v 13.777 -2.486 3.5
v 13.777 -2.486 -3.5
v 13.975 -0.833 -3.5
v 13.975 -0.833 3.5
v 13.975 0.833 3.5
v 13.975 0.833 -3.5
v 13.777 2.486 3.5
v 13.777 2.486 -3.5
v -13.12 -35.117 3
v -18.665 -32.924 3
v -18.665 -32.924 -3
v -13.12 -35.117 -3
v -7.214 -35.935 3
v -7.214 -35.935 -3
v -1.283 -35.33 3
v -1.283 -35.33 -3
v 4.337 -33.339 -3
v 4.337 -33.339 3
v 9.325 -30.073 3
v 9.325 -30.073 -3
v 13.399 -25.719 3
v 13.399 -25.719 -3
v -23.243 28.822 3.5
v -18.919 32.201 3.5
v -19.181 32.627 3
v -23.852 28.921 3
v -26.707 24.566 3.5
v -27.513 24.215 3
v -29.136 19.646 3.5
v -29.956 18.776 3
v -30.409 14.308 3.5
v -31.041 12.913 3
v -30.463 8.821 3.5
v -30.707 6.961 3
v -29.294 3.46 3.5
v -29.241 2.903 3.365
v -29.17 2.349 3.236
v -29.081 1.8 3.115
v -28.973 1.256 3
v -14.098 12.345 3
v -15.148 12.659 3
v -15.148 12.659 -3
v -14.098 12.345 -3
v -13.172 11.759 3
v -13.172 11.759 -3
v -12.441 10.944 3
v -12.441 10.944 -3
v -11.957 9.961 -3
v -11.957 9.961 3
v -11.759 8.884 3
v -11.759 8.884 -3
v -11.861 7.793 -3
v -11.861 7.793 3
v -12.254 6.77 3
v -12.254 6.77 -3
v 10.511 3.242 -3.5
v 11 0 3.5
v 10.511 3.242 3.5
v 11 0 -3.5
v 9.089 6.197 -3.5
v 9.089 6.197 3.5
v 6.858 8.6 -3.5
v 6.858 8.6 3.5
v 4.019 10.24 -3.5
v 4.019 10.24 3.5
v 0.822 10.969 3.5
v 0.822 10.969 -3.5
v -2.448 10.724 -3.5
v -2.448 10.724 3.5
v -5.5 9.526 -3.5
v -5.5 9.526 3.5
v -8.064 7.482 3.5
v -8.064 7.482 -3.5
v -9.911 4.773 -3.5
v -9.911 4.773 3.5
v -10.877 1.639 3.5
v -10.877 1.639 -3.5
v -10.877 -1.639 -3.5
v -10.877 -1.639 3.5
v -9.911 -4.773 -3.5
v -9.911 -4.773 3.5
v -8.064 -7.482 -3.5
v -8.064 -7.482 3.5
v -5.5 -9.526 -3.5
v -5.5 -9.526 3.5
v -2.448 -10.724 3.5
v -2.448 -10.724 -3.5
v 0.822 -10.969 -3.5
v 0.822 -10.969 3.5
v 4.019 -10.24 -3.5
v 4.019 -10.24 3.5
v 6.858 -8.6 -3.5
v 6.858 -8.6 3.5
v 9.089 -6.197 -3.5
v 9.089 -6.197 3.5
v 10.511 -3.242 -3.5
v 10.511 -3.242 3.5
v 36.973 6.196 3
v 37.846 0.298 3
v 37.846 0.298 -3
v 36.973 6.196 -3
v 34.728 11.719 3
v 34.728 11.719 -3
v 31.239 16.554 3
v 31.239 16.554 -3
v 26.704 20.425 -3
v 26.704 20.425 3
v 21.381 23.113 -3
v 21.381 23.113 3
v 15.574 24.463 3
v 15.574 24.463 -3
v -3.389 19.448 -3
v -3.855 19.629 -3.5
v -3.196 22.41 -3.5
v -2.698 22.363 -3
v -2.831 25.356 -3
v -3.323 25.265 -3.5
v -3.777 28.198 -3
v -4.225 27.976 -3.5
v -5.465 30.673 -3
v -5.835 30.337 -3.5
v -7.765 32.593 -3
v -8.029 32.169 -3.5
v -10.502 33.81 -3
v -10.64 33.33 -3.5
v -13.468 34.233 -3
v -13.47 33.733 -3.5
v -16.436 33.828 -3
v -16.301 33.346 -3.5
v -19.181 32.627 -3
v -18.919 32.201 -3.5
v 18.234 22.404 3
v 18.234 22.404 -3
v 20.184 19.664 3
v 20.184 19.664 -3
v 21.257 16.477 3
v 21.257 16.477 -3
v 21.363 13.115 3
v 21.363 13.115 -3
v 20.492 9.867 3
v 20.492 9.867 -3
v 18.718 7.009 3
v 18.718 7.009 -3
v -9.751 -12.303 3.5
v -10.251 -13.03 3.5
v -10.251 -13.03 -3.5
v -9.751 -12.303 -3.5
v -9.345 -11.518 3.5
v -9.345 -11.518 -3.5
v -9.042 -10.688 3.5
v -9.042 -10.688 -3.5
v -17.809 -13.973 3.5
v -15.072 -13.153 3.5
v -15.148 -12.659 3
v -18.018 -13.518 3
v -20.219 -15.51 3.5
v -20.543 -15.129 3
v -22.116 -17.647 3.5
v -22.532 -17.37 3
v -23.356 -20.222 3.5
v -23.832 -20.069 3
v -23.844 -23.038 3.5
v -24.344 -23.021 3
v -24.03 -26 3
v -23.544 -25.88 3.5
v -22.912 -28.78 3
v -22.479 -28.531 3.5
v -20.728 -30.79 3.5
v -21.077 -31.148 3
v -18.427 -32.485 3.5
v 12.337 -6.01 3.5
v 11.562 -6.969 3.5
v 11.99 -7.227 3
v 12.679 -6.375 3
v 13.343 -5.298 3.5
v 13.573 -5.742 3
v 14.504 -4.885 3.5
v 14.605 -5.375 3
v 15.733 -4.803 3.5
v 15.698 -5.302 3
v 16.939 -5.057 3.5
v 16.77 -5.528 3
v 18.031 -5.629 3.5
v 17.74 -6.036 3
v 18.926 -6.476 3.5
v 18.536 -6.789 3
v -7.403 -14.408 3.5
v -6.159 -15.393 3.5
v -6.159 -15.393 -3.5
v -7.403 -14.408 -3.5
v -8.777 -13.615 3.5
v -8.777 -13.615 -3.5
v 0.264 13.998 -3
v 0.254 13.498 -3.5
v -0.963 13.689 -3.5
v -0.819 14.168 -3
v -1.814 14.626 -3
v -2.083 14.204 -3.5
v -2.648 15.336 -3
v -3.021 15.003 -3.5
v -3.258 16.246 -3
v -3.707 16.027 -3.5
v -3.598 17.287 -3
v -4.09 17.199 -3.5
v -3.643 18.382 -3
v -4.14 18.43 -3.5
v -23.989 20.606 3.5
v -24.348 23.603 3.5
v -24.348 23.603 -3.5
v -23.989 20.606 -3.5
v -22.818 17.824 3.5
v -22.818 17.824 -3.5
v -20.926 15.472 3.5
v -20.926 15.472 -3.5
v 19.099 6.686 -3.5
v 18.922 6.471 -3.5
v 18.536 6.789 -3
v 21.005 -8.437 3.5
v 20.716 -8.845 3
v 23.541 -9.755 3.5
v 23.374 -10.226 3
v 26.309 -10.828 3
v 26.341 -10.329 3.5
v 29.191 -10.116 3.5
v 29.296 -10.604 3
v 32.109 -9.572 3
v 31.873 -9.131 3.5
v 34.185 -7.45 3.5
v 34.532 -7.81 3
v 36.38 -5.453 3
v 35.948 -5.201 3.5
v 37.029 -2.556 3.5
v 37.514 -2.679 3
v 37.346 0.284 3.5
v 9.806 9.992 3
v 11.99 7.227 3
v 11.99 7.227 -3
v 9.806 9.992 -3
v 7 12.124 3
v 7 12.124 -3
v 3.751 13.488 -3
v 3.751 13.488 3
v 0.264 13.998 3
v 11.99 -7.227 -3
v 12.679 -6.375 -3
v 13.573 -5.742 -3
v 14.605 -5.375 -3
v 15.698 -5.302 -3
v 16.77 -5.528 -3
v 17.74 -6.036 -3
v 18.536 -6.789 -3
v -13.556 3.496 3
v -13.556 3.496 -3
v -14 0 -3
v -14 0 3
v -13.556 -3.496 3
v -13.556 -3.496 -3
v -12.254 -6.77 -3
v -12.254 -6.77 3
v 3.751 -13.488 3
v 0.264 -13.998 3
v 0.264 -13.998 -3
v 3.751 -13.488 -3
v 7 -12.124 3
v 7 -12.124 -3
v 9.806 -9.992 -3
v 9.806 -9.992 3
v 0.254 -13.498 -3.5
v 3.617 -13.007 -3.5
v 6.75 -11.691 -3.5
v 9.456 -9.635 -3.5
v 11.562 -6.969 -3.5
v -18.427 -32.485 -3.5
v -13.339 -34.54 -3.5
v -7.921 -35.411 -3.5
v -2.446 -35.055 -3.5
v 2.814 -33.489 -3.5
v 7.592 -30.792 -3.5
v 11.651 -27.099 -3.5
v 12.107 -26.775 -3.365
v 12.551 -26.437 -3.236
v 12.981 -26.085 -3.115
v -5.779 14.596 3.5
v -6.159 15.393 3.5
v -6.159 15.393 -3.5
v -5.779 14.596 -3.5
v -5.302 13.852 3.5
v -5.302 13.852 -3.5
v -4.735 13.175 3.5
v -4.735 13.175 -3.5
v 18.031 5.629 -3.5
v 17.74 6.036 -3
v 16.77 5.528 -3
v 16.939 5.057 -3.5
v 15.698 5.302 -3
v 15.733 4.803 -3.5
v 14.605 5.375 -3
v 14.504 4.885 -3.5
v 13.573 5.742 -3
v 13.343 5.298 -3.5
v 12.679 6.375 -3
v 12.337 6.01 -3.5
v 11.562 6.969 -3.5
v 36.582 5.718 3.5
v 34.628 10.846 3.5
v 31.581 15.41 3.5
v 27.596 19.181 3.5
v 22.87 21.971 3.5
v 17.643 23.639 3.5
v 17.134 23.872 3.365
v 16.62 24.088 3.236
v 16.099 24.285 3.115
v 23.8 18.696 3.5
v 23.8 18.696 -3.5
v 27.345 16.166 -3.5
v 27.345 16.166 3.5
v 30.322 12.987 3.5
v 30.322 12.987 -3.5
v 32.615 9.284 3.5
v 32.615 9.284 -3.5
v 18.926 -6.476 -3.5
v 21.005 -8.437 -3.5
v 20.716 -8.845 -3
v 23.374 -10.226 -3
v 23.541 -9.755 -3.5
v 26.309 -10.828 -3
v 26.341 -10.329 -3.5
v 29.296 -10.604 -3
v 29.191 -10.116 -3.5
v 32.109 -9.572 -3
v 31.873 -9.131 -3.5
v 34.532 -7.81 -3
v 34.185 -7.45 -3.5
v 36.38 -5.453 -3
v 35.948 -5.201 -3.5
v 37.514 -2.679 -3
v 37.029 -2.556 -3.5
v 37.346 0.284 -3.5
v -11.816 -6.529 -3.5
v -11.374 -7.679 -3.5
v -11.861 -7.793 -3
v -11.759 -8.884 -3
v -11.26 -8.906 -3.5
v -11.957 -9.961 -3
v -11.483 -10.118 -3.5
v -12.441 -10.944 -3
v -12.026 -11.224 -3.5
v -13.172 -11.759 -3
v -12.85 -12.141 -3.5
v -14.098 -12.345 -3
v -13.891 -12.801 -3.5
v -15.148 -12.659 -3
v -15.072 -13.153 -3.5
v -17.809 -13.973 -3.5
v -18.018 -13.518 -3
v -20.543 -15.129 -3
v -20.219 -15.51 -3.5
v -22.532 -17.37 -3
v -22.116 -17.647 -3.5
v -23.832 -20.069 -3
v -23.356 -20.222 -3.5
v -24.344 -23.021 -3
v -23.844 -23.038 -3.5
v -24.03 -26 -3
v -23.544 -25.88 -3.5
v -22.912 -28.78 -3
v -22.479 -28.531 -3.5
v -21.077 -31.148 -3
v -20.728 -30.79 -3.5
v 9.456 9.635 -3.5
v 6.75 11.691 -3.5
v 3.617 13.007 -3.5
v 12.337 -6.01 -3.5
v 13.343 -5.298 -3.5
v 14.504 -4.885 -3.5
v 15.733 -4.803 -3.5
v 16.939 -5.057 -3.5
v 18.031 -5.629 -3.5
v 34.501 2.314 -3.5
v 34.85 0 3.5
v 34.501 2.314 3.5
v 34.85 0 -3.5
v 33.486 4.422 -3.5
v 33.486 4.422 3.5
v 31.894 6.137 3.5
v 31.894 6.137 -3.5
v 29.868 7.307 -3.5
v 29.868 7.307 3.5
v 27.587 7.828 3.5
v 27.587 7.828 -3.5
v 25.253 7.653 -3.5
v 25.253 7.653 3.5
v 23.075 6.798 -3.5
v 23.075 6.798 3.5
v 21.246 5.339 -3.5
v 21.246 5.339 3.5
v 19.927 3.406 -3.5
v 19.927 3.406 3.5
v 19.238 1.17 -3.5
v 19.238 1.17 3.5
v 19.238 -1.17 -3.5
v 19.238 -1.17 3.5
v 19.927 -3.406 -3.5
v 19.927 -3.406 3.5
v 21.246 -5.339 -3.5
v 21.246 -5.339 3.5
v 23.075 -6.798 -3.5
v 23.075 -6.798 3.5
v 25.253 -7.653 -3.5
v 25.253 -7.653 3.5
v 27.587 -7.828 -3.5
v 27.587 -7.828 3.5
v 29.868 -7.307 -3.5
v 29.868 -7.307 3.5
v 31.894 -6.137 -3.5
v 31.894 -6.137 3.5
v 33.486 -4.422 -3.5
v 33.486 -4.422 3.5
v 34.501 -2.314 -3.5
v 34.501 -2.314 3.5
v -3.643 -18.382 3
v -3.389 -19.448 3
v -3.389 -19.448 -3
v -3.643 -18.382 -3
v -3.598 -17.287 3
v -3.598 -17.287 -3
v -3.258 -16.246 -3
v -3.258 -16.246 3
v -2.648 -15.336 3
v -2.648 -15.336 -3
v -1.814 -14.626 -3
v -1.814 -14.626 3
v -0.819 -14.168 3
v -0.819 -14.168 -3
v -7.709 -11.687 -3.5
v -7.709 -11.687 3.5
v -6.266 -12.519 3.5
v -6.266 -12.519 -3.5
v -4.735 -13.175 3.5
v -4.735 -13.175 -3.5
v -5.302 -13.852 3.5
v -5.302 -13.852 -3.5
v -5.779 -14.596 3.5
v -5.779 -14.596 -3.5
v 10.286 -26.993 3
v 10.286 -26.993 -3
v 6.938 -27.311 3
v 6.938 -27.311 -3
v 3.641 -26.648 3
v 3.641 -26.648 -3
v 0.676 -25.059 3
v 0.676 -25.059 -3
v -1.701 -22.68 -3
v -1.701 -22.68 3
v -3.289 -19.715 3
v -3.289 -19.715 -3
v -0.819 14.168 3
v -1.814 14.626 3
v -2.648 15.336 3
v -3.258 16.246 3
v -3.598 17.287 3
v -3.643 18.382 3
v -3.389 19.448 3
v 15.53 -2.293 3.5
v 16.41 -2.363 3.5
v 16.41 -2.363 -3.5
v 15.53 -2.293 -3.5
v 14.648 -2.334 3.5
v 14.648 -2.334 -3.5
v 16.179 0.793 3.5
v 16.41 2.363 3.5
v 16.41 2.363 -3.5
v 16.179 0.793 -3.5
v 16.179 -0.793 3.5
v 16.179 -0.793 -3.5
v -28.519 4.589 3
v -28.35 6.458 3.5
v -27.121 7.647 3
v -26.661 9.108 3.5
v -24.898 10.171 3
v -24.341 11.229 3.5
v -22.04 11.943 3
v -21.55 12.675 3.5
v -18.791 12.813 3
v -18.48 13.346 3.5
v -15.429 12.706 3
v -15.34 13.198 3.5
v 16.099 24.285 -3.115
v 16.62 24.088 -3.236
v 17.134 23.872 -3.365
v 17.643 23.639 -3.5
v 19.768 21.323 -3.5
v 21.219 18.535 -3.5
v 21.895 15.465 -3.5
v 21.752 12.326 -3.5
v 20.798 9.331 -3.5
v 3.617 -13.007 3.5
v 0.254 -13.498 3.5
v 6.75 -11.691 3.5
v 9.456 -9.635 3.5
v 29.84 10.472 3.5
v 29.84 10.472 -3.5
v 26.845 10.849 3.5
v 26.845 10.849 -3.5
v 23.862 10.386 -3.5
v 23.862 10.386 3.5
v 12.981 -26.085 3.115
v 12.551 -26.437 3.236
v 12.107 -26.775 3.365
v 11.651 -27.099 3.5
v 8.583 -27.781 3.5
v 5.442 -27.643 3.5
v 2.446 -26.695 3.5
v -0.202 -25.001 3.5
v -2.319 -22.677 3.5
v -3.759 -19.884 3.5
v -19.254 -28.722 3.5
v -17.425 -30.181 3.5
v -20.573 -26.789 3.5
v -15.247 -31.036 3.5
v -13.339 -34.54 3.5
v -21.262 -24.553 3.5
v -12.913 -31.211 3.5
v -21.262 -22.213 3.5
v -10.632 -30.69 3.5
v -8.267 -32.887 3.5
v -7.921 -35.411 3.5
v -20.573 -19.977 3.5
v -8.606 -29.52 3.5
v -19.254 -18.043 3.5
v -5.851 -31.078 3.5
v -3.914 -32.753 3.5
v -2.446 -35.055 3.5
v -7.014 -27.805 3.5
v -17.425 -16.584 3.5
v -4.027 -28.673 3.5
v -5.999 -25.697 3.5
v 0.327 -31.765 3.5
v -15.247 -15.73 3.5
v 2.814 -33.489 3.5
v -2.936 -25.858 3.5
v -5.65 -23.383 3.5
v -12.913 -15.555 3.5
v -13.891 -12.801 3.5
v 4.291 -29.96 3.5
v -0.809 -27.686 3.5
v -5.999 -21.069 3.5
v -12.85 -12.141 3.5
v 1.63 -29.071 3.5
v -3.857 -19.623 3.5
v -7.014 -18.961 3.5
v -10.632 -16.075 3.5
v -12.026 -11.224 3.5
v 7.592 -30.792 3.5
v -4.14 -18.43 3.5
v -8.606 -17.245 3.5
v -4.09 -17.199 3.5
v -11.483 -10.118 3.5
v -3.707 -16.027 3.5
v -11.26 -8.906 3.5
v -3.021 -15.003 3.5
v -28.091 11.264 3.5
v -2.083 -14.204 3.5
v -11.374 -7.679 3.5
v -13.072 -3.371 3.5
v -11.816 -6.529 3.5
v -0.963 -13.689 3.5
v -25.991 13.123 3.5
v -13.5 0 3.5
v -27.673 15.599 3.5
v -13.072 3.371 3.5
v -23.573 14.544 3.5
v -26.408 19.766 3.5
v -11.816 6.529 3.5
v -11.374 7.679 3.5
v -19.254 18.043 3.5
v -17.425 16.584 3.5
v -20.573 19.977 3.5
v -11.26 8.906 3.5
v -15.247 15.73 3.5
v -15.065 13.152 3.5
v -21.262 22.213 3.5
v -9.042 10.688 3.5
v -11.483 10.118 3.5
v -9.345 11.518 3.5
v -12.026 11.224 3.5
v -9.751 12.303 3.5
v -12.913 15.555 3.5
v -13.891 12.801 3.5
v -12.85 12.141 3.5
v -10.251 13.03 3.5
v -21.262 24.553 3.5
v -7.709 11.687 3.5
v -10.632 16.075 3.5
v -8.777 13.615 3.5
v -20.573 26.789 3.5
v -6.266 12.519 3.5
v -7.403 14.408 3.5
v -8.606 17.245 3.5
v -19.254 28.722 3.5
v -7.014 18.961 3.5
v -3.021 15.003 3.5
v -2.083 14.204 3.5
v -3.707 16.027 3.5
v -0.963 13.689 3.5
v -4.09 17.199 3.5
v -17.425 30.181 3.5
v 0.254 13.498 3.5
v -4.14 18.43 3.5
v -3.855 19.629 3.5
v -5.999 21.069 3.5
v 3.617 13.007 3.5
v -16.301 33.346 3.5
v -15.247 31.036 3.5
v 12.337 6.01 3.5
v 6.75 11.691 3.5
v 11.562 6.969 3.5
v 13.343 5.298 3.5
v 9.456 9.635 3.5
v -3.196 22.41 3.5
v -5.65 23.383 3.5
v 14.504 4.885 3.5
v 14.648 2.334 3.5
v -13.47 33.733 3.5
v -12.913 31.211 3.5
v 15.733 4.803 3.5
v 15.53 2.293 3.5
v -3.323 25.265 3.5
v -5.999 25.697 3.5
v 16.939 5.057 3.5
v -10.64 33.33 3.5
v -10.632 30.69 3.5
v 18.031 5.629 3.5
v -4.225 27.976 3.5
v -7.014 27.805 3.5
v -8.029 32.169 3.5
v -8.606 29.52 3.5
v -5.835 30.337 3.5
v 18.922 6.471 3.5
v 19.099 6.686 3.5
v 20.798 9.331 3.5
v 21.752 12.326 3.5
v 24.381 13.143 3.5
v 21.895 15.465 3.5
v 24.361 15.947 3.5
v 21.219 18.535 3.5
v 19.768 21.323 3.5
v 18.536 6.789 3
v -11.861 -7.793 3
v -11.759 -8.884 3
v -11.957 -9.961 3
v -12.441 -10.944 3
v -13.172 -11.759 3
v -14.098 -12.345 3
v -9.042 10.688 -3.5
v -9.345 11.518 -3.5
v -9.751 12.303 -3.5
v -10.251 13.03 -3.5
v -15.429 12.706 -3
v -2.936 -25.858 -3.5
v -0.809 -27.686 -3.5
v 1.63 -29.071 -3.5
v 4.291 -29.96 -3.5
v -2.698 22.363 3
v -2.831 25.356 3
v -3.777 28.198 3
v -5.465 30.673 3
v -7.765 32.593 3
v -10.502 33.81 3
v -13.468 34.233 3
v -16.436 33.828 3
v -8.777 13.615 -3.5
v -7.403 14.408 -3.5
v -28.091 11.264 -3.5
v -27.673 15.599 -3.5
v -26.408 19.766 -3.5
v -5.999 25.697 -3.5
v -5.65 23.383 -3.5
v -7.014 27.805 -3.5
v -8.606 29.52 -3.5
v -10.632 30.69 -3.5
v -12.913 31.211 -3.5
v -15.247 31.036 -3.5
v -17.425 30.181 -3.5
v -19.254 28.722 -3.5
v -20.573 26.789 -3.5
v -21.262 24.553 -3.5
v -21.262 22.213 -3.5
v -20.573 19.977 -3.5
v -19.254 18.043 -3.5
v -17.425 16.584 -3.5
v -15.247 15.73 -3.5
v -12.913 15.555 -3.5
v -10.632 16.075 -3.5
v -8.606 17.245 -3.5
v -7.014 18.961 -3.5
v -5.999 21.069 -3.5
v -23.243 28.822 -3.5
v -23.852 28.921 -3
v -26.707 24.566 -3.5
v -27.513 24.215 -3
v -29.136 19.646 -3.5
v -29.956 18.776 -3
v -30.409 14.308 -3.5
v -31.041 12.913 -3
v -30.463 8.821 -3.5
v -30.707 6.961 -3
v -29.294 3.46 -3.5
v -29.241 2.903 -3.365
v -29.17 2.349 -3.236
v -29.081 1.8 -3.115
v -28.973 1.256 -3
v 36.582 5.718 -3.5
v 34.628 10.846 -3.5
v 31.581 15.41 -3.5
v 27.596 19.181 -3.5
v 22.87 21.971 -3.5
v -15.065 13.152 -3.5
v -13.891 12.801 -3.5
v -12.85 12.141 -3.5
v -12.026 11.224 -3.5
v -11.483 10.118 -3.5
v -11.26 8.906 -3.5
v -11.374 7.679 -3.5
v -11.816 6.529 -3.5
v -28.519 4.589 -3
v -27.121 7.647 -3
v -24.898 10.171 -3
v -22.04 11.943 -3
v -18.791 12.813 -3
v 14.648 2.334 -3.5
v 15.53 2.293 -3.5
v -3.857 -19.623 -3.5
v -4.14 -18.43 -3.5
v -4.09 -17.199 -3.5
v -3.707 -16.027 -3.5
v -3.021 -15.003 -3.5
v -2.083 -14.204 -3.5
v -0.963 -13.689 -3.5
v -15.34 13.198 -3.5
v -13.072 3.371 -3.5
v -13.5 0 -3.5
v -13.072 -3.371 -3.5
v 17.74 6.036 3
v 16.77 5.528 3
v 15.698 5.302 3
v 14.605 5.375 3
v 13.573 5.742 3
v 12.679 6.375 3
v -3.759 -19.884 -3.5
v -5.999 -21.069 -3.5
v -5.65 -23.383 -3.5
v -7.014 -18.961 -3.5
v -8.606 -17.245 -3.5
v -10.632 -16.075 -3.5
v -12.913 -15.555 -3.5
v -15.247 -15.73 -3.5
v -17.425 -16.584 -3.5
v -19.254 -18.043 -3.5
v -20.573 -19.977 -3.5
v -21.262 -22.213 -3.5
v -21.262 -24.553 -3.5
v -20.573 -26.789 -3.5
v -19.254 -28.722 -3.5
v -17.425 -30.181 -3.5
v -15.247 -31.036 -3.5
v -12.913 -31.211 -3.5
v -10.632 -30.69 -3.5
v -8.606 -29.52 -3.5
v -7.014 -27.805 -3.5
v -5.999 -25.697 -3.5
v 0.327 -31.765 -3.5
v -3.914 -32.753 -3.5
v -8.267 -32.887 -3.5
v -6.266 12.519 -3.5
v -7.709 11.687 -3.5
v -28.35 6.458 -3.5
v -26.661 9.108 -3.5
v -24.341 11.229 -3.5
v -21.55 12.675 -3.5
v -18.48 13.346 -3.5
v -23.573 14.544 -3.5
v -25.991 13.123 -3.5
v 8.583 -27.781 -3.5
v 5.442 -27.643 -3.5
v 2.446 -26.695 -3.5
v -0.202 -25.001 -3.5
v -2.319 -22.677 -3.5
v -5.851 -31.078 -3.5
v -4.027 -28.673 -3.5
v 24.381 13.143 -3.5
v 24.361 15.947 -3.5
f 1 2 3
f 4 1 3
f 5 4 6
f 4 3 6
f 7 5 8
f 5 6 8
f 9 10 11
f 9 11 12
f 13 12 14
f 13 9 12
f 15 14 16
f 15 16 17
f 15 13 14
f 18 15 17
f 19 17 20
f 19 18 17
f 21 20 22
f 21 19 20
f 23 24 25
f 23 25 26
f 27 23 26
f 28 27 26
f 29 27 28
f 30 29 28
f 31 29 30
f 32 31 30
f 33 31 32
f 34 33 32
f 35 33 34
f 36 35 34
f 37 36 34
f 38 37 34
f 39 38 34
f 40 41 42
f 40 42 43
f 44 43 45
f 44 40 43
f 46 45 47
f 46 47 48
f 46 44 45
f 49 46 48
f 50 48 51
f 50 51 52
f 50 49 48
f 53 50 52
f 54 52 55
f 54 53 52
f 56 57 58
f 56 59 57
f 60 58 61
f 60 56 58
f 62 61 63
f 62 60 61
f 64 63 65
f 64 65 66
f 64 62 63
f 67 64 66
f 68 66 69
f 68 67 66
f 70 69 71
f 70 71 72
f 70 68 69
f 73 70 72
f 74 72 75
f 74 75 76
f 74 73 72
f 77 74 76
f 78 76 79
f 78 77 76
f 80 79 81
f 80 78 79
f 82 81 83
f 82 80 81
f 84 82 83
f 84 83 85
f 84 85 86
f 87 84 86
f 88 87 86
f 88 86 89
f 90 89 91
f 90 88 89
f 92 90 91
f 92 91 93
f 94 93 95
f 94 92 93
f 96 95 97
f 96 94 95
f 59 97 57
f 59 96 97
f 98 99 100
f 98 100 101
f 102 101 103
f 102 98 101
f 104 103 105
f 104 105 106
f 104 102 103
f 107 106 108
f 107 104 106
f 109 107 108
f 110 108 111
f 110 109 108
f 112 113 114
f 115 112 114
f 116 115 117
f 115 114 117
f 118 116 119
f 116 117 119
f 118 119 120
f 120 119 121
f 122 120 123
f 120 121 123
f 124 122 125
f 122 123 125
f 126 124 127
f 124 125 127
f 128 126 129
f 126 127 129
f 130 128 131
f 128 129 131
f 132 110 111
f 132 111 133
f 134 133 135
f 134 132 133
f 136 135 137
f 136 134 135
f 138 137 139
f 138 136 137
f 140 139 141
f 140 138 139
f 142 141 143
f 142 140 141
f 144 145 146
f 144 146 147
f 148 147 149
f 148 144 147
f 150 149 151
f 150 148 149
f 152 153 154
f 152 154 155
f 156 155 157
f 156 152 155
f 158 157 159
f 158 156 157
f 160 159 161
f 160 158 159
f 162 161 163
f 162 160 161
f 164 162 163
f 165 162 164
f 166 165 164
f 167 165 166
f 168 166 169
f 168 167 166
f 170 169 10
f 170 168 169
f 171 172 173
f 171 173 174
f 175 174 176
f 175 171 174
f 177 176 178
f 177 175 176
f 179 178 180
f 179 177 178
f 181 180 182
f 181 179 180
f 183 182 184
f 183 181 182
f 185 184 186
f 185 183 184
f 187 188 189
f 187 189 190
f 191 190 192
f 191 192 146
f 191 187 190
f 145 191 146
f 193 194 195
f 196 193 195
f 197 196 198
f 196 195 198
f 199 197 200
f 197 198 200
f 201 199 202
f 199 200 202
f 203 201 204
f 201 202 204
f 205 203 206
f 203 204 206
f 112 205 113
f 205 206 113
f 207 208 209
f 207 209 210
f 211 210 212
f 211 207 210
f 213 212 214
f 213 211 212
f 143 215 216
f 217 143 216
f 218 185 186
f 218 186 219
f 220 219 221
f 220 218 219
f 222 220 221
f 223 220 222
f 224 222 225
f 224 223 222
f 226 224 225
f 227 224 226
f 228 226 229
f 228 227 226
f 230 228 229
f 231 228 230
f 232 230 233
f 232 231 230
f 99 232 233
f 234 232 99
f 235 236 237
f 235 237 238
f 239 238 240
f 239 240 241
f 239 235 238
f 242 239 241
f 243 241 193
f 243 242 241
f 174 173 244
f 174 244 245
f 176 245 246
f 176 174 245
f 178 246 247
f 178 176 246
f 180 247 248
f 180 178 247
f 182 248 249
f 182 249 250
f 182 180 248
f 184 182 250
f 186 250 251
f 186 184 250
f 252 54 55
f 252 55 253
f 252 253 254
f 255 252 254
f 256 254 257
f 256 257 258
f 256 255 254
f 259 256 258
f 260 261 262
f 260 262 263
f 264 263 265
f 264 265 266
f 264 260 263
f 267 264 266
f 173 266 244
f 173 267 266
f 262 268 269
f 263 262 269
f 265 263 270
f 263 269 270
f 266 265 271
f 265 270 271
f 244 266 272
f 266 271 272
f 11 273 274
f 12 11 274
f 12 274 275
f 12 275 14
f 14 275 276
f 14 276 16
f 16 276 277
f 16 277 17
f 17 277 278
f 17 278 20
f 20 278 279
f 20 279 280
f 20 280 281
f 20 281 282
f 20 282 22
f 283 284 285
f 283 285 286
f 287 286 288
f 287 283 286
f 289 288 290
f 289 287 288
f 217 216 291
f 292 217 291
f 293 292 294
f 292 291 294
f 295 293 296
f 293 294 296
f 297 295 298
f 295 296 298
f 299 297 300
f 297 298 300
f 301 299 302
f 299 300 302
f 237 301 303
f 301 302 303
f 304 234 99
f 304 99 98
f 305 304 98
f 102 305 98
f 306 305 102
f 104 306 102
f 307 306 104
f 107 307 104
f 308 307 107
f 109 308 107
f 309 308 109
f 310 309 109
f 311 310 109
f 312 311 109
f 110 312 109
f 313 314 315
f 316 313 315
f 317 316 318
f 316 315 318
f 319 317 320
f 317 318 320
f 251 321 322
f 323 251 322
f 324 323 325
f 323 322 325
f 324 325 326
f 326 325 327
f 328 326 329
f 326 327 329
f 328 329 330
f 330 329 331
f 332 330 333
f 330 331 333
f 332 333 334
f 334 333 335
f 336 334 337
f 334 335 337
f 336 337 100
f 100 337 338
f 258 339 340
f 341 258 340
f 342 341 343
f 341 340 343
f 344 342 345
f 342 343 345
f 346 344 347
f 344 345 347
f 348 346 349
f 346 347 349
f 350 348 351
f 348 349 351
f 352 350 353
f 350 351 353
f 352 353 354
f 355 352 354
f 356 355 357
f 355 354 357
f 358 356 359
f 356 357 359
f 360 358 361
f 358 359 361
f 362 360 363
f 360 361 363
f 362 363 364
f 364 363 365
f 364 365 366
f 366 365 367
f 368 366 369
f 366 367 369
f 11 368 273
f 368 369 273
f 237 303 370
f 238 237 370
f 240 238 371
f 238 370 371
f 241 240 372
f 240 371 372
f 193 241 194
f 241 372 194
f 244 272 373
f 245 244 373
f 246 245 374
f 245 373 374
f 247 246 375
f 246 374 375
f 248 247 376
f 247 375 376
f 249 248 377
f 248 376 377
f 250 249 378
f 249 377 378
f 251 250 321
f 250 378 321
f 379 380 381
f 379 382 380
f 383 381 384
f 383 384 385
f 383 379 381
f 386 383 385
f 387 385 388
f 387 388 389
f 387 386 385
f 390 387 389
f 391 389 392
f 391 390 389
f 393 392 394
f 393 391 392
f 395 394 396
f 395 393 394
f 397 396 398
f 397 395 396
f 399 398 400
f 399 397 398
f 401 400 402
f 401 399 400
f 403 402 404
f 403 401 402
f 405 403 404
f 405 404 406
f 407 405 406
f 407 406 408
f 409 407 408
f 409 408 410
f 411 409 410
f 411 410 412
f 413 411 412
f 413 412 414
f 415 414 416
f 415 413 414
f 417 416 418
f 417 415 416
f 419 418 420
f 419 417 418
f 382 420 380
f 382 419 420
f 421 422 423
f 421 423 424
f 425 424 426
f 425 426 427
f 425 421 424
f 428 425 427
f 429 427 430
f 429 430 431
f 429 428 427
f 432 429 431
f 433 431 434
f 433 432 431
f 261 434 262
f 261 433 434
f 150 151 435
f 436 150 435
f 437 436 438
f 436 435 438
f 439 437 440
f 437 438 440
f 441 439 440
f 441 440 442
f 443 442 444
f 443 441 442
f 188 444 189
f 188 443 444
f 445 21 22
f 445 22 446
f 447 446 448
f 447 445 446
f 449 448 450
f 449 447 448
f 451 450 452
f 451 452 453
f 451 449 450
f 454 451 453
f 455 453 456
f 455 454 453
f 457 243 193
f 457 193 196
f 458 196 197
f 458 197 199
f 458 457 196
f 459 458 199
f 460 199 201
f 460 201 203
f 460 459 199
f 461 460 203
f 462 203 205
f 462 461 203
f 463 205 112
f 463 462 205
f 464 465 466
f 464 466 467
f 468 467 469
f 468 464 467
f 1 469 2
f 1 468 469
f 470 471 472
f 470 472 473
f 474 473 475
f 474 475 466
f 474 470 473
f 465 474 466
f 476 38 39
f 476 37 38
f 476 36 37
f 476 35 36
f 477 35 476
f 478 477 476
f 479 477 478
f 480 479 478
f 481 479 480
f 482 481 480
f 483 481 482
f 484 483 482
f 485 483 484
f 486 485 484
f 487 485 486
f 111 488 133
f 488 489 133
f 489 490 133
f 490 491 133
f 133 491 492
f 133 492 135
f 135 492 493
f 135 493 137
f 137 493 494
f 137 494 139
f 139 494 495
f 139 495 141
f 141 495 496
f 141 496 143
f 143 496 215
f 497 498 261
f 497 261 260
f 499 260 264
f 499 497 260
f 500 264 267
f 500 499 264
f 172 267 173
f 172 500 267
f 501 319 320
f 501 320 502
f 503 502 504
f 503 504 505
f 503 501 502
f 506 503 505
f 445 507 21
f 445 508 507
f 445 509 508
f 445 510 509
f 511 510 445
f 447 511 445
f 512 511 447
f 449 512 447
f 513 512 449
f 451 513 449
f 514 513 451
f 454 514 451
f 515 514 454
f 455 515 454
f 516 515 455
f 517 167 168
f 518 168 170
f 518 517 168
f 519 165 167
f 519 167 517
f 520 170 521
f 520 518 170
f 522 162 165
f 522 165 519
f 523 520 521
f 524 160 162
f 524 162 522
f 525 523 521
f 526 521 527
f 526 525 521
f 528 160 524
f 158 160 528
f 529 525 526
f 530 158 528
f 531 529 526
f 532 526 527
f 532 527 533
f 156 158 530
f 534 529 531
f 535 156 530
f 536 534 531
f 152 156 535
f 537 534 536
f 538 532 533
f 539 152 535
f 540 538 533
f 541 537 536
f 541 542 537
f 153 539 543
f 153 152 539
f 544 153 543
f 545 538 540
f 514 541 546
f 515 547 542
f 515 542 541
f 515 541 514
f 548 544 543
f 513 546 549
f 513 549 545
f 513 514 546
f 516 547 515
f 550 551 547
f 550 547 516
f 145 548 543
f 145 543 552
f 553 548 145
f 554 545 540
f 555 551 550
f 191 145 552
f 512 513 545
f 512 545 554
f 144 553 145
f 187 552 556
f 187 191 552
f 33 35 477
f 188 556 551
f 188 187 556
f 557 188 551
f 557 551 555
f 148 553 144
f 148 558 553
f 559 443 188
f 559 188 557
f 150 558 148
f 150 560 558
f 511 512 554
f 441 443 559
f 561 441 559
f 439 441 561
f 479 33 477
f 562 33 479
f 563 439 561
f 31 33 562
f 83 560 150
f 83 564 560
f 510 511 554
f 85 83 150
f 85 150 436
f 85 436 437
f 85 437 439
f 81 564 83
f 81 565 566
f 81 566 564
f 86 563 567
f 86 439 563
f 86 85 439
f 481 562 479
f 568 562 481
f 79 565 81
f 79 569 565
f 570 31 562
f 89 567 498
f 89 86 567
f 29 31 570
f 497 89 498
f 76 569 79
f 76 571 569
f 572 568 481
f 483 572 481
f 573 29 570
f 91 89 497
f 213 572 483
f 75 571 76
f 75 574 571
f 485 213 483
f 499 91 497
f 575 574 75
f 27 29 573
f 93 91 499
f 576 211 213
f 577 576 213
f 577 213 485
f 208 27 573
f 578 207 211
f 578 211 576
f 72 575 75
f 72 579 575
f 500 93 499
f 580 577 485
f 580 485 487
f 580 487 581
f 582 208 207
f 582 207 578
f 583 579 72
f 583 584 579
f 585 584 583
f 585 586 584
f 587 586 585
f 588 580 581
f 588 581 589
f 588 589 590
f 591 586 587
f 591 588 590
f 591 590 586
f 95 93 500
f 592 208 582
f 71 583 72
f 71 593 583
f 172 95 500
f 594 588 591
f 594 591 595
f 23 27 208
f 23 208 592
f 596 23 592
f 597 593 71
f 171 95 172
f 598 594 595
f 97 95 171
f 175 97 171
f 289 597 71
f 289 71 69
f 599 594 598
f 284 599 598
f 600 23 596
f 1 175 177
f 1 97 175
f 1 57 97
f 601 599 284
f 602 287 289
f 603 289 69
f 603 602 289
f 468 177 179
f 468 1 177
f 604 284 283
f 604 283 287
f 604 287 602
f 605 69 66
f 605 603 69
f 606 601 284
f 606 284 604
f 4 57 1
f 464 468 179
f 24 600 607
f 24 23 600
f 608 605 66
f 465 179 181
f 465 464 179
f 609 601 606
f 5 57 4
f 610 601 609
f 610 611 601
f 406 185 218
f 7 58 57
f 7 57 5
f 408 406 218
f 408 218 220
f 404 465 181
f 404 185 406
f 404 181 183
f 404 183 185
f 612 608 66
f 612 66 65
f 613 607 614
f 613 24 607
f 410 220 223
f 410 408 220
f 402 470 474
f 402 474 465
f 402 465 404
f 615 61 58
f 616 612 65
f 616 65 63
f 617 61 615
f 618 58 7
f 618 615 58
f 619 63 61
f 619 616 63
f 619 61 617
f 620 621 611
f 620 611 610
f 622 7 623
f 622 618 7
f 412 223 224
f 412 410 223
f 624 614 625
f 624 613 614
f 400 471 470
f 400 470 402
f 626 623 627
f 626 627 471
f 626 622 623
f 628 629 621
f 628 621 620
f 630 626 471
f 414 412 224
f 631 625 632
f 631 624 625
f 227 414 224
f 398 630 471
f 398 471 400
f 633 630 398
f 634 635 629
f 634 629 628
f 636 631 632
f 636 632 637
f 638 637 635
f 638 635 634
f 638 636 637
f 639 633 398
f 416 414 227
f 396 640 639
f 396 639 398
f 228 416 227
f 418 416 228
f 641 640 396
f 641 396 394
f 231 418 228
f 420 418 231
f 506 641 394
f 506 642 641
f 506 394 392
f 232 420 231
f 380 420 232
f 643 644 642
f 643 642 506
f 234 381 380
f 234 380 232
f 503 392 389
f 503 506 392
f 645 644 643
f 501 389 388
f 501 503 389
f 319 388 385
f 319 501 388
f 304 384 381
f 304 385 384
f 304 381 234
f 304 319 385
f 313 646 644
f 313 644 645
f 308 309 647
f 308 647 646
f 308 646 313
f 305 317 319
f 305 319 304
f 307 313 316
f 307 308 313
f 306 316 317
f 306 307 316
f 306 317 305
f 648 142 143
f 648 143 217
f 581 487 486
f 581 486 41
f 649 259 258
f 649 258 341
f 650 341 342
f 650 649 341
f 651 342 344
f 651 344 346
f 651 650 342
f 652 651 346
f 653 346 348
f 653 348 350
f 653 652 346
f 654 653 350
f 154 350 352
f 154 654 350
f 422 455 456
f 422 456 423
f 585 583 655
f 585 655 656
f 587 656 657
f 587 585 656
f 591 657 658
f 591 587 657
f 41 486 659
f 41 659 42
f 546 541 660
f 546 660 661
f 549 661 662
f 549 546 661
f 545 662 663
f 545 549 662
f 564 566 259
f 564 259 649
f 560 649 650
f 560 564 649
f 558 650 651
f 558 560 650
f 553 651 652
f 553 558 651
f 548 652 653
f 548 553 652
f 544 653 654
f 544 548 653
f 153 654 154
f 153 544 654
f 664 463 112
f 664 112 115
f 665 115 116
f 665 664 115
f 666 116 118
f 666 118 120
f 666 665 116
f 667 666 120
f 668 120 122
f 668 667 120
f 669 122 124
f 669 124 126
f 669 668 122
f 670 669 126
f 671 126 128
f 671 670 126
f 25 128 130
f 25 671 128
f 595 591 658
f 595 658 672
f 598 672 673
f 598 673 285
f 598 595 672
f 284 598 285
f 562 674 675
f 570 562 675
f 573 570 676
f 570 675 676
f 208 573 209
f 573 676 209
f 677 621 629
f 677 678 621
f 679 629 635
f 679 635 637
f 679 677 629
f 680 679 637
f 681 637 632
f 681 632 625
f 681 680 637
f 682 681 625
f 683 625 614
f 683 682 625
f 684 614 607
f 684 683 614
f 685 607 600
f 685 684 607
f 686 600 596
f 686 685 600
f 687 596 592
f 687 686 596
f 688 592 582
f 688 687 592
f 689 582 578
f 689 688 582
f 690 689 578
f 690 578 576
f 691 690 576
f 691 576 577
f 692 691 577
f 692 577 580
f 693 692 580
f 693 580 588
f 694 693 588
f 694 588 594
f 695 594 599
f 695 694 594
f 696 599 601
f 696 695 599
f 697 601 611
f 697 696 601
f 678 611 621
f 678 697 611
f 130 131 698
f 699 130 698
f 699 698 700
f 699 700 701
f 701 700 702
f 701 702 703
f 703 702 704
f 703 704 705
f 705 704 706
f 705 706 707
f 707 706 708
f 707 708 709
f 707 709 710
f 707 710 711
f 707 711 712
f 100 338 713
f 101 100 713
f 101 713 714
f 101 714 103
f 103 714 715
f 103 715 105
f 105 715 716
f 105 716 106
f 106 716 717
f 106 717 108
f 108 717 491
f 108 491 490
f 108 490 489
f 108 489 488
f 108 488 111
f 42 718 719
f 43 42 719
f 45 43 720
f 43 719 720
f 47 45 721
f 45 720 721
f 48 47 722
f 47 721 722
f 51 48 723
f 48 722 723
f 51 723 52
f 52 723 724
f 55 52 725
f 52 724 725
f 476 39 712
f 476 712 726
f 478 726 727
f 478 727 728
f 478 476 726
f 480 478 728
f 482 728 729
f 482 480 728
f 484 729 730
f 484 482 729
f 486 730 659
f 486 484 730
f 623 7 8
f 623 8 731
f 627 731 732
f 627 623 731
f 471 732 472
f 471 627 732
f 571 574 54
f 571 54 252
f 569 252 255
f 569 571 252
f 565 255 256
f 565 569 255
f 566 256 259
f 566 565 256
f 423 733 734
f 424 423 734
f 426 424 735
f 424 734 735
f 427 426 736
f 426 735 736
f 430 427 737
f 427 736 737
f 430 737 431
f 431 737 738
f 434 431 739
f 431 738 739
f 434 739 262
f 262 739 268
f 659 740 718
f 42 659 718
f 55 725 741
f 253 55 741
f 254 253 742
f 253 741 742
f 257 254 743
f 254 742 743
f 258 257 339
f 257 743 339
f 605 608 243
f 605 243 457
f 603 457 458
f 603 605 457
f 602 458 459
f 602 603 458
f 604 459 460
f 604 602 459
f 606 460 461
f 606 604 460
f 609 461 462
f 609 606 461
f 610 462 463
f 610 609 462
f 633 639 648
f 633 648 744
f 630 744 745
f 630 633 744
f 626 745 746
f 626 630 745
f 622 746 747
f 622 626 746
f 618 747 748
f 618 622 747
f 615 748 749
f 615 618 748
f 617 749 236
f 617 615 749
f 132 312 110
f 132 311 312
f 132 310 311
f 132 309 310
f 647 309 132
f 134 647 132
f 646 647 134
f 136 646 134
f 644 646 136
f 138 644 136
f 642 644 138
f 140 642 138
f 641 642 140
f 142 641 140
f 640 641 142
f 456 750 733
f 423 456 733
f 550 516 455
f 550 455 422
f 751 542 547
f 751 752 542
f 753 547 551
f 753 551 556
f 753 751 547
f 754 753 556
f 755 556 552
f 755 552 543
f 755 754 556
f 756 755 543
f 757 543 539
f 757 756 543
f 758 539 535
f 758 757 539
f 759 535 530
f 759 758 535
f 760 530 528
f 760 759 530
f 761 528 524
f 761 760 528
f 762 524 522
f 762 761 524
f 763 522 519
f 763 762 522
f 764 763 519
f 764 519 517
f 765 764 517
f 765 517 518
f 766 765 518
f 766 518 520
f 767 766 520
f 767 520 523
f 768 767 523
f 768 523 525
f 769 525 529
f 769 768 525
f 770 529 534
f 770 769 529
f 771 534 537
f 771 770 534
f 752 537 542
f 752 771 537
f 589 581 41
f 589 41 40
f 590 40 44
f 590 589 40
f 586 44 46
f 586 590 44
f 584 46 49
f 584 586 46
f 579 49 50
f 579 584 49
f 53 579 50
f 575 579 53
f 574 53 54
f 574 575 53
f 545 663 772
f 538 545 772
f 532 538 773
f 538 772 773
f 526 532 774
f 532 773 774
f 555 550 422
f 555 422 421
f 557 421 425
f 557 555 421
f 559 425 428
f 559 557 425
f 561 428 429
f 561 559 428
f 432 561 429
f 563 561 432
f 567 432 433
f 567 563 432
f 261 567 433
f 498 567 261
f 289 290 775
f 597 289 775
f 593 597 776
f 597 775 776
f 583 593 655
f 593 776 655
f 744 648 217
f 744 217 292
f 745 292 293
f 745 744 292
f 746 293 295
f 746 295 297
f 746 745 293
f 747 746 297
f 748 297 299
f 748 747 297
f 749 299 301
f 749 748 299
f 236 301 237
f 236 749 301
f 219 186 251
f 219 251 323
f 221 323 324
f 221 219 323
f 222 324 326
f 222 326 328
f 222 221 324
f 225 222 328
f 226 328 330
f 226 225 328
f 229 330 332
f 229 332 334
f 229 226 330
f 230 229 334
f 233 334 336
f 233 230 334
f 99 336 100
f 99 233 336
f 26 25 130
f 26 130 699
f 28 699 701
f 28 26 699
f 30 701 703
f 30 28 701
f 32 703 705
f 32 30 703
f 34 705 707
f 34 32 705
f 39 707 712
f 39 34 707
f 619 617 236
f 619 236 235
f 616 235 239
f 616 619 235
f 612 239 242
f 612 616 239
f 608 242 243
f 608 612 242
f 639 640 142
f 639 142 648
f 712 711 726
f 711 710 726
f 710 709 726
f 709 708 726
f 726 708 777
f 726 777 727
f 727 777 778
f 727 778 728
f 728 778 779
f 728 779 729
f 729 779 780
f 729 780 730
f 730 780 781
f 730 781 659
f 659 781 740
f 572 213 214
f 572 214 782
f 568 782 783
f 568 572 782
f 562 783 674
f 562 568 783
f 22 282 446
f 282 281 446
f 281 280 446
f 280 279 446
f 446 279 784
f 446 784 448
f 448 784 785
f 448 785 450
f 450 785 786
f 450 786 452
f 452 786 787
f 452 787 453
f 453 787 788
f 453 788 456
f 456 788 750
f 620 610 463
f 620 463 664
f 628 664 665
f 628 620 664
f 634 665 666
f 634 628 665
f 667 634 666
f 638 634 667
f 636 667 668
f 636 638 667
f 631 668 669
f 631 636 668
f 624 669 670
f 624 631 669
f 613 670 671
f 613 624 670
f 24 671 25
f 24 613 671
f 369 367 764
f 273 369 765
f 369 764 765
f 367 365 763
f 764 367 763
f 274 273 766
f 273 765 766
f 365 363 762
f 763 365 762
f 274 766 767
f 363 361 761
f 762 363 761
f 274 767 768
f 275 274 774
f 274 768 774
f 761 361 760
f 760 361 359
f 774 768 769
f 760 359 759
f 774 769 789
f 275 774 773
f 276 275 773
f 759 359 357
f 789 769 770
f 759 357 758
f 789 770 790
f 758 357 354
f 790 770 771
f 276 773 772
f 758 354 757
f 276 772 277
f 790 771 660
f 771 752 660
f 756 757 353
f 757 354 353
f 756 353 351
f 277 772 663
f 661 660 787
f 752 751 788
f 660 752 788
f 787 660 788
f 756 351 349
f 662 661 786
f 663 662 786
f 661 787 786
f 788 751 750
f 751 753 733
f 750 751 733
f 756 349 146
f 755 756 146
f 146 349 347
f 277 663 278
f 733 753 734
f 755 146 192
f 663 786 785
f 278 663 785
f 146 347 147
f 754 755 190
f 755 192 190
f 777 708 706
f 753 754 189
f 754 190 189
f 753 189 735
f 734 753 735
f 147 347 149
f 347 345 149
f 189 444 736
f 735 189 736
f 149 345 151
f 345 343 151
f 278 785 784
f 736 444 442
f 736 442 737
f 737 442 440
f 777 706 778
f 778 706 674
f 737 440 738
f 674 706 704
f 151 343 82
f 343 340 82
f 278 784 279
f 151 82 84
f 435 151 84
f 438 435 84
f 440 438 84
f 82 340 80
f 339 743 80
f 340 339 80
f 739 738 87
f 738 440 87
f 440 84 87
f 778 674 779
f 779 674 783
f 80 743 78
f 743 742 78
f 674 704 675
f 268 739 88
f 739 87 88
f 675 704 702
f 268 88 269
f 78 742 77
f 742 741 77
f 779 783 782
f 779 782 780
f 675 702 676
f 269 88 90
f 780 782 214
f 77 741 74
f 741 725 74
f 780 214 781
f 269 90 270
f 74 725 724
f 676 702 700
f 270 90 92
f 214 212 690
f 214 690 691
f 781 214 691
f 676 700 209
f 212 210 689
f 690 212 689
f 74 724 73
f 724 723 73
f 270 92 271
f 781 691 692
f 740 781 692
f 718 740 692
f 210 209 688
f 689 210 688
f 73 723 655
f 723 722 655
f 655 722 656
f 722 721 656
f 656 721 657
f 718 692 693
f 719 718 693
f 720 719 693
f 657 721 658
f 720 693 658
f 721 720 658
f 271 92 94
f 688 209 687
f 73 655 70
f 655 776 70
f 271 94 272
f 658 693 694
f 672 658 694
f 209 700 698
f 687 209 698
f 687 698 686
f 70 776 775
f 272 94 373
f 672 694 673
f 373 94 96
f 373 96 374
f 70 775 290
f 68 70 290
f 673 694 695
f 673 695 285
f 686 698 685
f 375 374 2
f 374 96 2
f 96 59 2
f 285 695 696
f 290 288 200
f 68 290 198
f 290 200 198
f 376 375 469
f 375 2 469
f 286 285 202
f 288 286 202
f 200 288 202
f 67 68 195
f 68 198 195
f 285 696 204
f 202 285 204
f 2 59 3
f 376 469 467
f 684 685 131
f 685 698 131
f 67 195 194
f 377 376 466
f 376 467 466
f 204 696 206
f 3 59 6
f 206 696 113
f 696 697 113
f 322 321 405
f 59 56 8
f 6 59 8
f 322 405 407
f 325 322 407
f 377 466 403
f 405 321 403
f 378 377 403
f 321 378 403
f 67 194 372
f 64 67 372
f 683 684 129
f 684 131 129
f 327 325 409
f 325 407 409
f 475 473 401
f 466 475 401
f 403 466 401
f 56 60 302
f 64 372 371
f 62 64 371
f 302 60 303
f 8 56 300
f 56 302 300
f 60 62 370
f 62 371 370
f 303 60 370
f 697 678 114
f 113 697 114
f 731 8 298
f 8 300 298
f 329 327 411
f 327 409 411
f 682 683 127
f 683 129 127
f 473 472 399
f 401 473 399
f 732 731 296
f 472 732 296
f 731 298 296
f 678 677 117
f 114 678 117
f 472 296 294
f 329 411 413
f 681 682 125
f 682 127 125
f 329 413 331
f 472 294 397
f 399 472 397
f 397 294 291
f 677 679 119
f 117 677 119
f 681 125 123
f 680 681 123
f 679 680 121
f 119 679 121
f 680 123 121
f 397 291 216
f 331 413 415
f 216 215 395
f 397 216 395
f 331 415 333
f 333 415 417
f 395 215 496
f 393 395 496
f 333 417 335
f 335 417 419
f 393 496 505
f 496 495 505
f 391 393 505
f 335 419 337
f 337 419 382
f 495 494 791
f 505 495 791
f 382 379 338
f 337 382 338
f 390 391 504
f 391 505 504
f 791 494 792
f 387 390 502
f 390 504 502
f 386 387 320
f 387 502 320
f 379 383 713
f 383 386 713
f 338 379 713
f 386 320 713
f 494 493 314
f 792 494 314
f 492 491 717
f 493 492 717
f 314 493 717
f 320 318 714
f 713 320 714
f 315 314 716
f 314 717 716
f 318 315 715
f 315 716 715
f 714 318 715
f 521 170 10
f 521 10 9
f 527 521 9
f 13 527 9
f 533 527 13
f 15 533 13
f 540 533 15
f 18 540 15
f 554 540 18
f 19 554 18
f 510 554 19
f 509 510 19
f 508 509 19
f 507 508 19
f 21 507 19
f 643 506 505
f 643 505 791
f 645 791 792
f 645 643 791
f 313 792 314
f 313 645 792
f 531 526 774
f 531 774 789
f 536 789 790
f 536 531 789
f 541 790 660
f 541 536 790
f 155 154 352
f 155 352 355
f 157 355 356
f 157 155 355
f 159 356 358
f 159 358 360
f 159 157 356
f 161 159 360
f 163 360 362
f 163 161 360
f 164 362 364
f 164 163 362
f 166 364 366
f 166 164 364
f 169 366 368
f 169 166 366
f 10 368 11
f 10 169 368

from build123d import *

# Parameters (mm, degrees)
F0_R     = 7.85
F0_R_2   = 11
F1_DEPTH = 3.5
F2_SIZE  = 0.5


with BuildPart() as f1:
    # F0 (on Top) → F1 (new body, symmetric)
    with BuildSketch(Plane.XY):
        with BuildLine():
            ThreePointArc((11.990417, -7.227026), (15.149203, -5.300815), (18.536452, -6.789025))
            ThreePointArc((18.536452, -6.789025), (30.738328, -10.185647), (37.845909, 0.297917))
            ThreePointArc((37.845909, 0.297917), (31.238527, 16.554265), (15.574074, 24.463201))
            ThreePointArc((15.574074, 24.463201), (21.25735, 16.476695), (18.717818, 7.009135))
            Line((18.717818, 7.009135), (18.536452, 6.789025))
            ThreePointArc((18.536452, 6.789025), (15.149203, 5.300815), (11.990417, 7.227026))
            ThreePointArc((11.990417, 7.227026), (7, 12.124356), (0.26358, 13.997519))
            ThreePointArc((0.26358, 13.997519), (-2.983961, 15.770002), (-3.388758, 19.447551))
            ThreePointArc((-3.388758, 19.447551), (-6.548135, 31.712997), (-19.180959, 32.62656))
            ThreePointArc((-19.180959, 32.62656), (-29.955678, 18.776225), (-28.972791, 1.255943))
            ThreePointArc((-28.972791, 1.255943), (-24.897911, 10.171058), (-15.428998, 12.705539))
            Line((-15.428998, 12.705539), (-15.147694, 12.658526))
            ThreePointArc((-15.147694, 12.658526), (-12.165242, 10.469187), (-12.253997, 6.770492))
            ThreePointArc((-12.253997, 6.770492), (-14, 0), (-12.253997, -6.770492))
            ThreePointArc((-12.253997, -6.770492), (-12.165242, -10.469187), (-15.147694, -12.658526))
            ThreePointArc((-15.147694, -12.658526), (-24.190193, -21.52735), (-18.664951, -32.924477))
            ThreePointArc((-18.664951, -32.924477), (-1.282849, -35.330491), (13.398717, -25.719144))
            ThreePointArc((13.398717, -25.719144), (3.640561, -26.647752), (-3.288821, -19.714673))
            Line((-3.288821, -19.714673), (-3.388758, -19.447551))
            ThreePointArc((-3.388758, -19.447551), (-2.983961, -15.770002), (0.26358, -13.997519))
            ThreePointArc((0.26358, -13.997519), (7, -12.124356), (11.990417, -7.227026))
        make_face()
        with BuildLine():
            ThreePointArc((4.290765, -29.959535), (-1.768845, -32.364165), (-8.267103, -32.887384))
            ThreePointArc((-8.267103, -32.887384), (-4.854938, -29.939011), (-2.936149, -25.858076))
            ThreePointArc((-2.936149, -25.858076), (0.377208, -28.437591), (4.290765, -29.959535))
        make_face(mode=Mode.SUBTRACT)
        with Locations((-13.5, -23.382686)):
            Circle(F0_R, mode=Mode.SUBTRACT)
        with BuildLine():
            ThreePointArc((-10.25149, -13.030407), (-9.535528, -11.916841), (-9.042029, -10.688391))
            ThreePointArc((-9.042029, -10.688391), (-7, -12.124356), (-4.735404, -13.174823))
            ThreePointArc((-4.735404, -13.174823), (-5.552523, -14.21643), (-6.158919, -15.393254))
            ThreePointArc((-6.158919, -15.393254), (-8.075, -13.98631), (-10.25149, -13.030407))
        make_face(mode=Mode.SUBTRACT)
        Circle(F0_R_2, mode=Mode.SUBTRACT)
        with BuildLine():
            ThreePointArc((-6.158919, 15.393254), (-5.552523, 14.21643), (-4.735404, 13.174823))
            ThreePointArc((-4.735404, 13.174823), (-7, 12.124356), (-9.042029, 10.688391))
            ThreePointArc((-9.042029, 10.688391), (-9.535528, 11.916841), (-10.25149, 13.030407))
            ThreePointArc((-10.25149, 13.030407), (-8.075, 13.98631), (-6.158919, 15.393254))
        make_face(mode=Mode.SUBTRACT)
        with BuildLine():
            ThreePointArc((-28.091101, 11.263856), (-27.143766, 17.713947), (-24.347759, 23.603213))
            ThreePointArc((-24.347759, 23.603213), (-23.500475, 19.174005), (-20.925676, 15.471818))
            ThreePointArc((-20.925676, 15.471818), (-24.816281, 13.892124), (-28.091101, 11.263856))
        make_face(mode=Mode.SUBTRACT)
        with Locations((-13.5, 23.382686)):
            Circle(F0_R, mode=Mode.SUBTRACT)
        with BuildLine():
            ThreePointArc((16.410408, -2.362847), (15.088051, -2.299589), (13.777433, -2.486431))
            ThreePointArc((13.777433, -2.486431), (14, 0), (13.777433, 2.486431))
            ThreePointArc((13.777433, 2.486431), (15.088051, 2.299589), (16.410408, 2.362847))
            ThreePointArc((16.410408, 2.362847), (16.15, 0), (16.410408, -2.362847))
        make_face(mode=Mode.SUBTRACT)
        with Locations((27, 0)):
            Circle(F0_R, mode=Mode.SUBTRACT)
        with BuildLine():
            ThreePointArc((23.800336, 18.695679), (28.912611, 14.650218), (32.614862, 9.284171))
            ThreePointArc((32.614862, 9.284171), (28.355413, 10.765006), (23.861825, 10.386258))
            ThreePointArc((23.861825, 10.386258), (24.439072, 14.545468), (23.800336, 18.695679))
        make_face(mode=Mode.SUBTRACT)
    extrude(amount=F1_DEPTH, both=True)

    # F2
    f2_edges = [f1.edges().sort_by_distance(p)[0] for p in [
        (7, -12.124356, -3.5),
        (-24.190193, -21.52735, -3.5),
        (3.640561, -26.647752, -3.5),
        (-24.897911, 10.171058, -3.5),
        (-29.955678, 18.776225, -3.5),
        (21.25735, 16.476695, -3.5),
        (21.25735, 16.476695, 3.5),
        (7, 12.124356, 3.5),
        (31.238527, 16.554265, 3.5),
        (3.640561, -26.647752, 3.5),
        (-1.282849, -35.330491, 3.5),
        (-24.897911, 10.171058, 3.5),
    ]]
    chamfer(f2_edges, length=F2_SIZE)


solid = f1.part
